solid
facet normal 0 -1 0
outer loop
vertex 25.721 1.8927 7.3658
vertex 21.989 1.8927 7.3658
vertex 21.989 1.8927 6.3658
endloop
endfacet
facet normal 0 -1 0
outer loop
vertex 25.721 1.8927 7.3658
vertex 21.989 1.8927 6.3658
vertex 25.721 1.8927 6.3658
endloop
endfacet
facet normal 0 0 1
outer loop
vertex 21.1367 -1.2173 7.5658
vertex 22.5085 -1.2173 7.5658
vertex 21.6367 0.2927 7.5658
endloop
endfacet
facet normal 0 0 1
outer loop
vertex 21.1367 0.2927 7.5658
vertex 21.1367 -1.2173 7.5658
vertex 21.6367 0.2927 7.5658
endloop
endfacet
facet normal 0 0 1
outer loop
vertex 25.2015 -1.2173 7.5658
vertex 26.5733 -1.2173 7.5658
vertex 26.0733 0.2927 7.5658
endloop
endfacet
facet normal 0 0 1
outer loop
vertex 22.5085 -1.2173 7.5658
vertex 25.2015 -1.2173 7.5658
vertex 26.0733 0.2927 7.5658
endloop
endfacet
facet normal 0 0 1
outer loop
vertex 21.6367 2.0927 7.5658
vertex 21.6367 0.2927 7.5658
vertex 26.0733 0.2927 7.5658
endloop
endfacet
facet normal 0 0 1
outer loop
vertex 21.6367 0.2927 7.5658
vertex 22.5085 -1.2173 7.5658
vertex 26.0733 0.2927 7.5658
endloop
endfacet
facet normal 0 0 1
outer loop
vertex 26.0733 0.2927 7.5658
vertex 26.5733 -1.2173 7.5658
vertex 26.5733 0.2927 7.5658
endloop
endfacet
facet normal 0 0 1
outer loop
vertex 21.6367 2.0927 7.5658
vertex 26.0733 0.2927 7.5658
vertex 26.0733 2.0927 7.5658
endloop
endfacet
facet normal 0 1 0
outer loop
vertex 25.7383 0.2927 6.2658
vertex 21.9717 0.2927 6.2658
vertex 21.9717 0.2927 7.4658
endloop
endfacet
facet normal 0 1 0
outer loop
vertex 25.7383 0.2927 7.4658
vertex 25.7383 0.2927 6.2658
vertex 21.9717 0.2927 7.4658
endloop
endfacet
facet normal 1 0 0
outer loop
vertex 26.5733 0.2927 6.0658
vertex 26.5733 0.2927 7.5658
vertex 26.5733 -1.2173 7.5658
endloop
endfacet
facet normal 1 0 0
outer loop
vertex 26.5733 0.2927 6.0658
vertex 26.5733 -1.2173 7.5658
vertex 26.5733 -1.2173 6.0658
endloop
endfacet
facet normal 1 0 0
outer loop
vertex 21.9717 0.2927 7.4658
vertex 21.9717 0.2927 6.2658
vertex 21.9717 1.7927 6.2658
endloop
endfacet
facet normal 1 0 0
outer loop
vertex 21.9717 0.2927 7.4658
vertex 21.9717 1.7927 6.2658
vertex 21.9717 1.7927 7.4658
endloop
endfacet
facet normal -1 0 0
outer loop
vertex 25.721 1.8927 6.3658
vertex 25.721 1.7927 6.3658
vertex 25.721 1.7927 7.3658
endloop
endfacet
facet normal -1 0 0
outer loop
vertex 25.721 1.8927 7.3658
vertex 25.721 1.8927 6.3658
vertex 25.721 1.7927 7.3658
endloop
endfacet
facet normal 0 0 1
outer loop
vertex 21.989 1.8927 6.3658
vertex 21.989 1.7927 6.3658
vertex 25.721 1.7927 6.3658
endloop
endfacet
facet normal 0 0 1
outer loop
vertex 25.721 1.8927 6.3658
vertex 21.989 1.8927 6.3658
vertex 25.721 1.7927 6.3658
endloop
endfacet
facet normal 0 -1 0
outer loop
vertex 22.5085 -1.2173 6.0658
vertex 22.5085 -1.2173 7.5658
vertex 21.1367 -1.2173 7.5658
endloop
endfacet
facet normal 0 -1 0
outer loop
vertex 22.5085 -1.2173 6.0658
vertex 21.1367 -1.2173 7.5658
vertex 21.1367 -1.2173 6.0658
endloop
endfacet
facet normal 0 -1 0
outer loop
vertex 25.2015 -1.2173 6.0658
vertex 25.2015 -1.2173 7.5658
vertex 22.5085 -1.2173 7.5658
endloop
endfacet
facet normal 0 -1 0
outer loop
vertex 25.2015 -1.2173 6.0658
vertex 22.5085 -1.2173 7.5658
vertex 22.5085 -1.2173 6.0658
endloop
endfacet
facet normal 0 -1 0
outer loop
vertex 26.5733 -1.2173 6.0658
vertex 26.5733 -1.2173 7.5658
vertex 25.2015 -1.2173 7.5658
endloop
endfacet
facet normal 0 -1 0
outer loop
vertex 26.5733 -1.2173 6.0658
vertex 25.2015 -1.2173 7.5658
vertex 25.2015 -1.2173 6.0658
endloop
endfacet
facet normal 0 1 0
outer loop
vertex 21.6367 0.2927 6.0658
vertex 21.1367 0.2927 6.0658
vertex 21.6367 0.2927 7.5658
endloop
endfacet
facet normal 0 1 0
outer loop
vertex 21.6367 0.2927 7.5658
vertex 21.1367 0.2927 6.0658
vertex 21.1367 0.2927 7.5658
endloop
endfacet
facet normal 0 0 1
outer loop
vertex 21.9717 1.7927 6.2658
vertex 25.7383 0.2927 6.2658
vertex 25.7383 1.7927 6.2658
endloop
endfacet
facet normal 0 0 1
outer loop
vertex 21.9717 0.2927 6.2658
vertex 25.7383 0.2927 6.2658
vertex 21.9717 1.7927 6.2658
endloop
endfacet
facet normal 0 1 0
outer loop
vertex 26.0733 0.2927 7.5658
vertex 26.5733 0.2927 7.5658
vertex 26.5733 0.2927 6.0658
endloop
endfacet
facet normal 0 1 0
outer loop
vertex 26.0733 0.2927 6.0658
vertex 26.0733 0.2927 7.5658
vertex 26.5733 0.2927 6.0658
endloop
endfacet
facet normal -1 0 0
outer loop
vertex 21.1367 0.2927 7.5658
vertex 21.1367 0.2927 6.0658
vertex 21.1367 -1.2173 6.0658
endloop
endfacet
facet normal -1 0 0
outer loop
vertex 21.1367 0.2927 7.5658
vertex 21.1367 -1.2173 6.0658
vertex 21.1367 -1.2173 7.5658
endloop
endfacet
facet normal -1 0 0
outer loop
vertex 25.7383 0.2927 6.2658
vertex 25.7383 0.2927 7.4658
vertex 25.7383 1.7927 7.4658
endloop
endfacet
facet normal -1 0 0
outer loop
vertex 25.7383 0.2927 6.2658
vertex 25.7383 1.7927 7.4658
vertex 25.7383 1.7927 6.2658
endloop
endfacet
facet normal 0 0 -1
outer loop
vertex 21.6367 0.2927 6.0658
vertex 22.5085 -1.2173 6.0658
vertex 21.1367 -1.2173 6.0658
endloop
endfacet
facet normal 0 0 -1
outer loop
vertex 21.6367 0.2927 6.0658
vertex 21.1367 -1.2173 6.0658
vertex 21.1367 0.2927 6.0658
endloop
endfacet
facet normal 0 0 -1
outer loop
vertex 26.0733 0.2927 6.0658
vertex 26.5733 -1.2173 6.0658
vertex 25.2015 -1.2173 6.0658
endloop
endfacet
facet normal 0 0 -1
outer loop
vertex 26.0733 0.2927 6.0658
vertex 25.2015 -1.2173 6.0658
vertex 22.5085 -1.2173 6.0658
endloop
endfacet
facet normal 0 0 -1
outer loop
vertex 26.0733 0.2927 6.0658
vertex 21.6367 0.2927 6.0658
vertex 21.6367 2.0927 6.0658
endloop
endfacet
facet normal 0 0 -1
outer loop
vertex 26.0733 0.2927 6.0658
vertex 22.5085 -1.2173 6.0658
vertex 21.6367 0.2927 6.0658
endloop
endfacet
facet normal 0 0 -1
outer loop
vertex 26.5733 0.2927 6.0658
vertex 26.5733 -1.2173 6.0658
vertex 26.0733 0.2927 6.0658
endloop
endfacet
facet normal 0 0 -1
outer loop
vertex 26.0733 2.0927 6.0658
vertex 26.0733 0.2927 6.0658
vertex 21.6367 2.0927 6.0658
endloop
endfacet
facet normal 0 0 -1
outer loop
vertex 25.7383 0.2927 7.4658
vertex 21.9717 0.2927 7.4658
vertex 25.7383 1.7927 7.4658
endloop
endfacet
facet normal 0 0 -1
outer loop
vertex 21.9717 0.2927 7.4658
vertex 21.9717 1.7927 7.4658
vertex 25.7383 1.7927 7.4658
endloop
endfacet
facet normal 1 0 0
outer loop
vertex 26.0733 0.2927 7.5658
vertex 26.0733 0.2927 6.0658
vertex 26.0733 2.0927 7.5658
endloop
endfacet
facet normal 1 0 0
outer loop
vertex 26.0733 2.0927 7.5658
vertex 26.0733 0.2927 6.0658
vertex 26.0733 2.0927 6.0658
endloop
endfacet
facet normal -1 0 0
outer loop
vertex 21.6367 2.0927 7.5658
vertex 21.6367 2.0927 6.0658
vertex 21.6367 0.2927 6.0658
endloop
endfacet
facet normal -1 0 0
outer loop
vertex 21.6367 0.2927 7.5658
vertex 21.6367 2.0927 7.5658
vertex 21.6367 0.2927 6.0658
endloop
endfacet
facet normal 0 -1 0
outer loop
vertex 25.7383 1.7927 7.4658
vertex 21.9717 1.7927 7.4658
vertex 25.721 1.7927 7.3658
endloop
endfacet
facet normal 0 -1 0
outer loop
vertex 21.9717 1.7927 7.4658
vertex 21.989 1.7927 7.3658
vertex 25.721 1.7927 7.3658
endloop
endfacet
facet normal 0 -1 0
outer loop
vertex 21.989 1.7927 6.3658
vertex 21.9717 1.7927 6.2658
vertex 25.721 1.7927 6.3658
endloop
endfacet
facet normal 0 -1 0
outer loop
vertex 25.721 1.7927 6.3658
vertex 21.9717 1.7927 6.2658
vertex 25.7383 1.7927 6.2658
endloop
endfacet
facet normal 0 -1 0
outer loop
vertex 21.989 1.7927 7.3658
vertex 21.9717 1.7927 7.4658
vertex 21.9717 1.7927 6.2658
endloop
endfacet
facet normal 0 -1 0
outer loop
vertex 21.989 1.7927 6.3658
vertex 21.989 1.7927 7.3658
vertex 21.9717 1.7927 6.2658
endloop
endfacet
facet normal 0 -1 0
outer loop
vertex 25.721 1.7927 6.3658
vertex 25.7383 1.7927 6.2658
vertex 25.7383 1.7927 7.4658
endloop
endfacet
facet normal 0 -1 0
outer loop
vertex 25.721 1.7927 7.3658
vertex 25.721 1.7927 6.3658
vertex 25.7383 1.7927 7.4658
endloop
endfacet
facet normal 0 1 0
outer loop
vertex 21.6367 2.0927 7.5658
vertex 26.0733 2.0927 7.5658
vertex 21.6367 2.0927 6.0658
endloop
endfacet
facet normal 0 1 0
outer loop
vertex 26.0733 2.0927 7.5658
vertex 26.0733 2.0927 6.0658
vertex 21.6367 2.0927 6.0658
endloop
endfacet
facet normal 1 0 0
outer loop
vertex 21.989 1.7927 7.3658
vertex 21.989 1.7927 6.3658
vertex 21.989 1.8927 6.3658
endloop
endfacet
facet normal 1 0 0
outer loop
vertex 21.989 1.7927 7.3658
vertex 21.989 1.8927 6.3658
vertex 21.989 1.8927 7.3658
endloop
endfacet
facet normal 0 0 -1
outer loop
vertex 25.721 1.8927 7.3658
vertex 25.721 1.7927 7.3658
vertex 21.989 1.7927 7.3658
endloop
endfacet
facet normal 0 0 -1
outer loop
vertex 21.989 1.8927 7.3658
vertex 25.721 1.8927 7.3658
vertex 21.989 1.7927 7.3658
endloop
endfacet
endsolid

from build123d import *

# Parameters (mm, degrees)
EXTRUDE_1_DEPTH     = 2
EXTRUDE_5_DEPTH     = 12
SKETCH_3_R          = 2
EXTRUDE_6_DEPTH     = 12
CUT_EXTRUDE_1_DEPTH = 12
EXTRUDE_7_DEPTH     = 15
SKETCH_7_W          = 44.36597813
SKETCH_7_H          = 14
EXTRUDE_8_DEPTH     = 3
SKETCH_9_W          = 18.66
SKETCH_9_H          = 10
CUT_EXTRUDE_3_DEPTH = 1
EXTRUDE_9_DEPTH     = 1
SCALE_1_SCALE       = 0.1
SKETCH_11_W         = 1.5
SKETCH_11_H         = 1.51
EXTRUDE_10_DEPTH    = 0.5
SKETCH_12_W         = 1.5
SKETCH_12_H         = 1.51
EXTRUDE_11_DEPTH    = 0.5
SKETCH_13_W         = 5.436597812
SKETCH_13_H         = 1.51
EXTRUDE_12_DEPTH    = 1.5


with BuildPart() as part:
    # 스케치2 → 보스-돌출1 (new body)
    with BuildSketch(Plane.XY):
        Polygon((0, 0), (47.71, 0), (37.32, -17.996007891), (10.39, -17.996007891), align=None)
    extrude(amount=EXTRUDE_1_DEPTH)

    # 스케치4 → 보스-돌출5 (add)
    with BuildSketch(Plane.XY.offset(2)):
        Polygon((13.739529946, -17.996007891), (5.021540881, -2.896007891), (1.672010935, -2.896007891), (10.39, -17.996007891), align=None)
        Polygon((46.037989065, -2.896007891), (42.688459119, -2.896007891), (33.970470054, -17.996007891), (37.32, -17.996007891), align=None)
    extrude(amount=EXTRUDE_5_DEPTH)

    # 스케치3 → 보스-돌출6 (add)
    with BuildSketch(Plane.XY.offset(2)):
        with Locations(Location((15.355, -11.594084102, 0), (0, 0, 180))):
            Circle(SKETCH_3_R)
        with Locations((32.355, -11.594084102)):
            Circle(SKETCH_3_R)
    extrude(amount=EXTRUDE_6_DEPTH)

    # 스케치5 → 컷-돌출1 (cut)
    with BuildSketch(Plane.XY.offset(2)):
        Polygon((0, 0), (47.71, 0), (46.037989065, -2.896007891), (1.672010935, -2.896007891), align=None)
    extrude(amount=-CUT_EXTRUDE_1_DEPTH, mode=Mode.SUBTRACT)

    # 스케치6 → 보스-돌출7 (add)
    with BuildSketch(Plane(origin=(0, -2.896007891, 0), x_dir=(1, 0, 0), z_dir=(0, 1, 0))):
        Polygon((5.021540881, -14), (1.672010935, -14), (1.672010935, 0), (46.037989065, 0), (46.037989065, -14), (42.688459119, -14), (42.688459119, -2), (5.021540881, -2), align=None)
    extrude(amount=EXTRUDE_7_DEPTH)

    # 스케치7 → 보스-돌출8 (add)
    with BuildSketch(Plane(origin=(0, 12.103992109, 0), x_dir=(1, 0, 0), z_dir=(0, 1, 0))):
        with Locations((23.855, -7)):
            Rectangle(SKETCH_7_W, SKETCH_7_H)
    extrude(amount=EXTRUDE_8_DEPTH)

    # 스케치9 → 컷-돌출3 (cut)
    with BuildSketch(Plane.XZ.offset(-12.103992109)):
        with Locations((14.525, 8)):
            Rectangle(SKETCH_9_W, SKETCH_9_H)
        with Locations((33.185, 8)):
            Rectangle(SKETCH_9_W, SKETCH_9_H)
    extrude(amount=-CUT_EXTRUDE_3_DEPTH, mode=Mode.SUBTRACT)

    # 스케치10 → 보스-돌출9 (add)
    with BuildSketch(Plane.XY.offset(14)):
        Polygon((10.39, -17.996007891), (37.32, -17.996007891), (46.037989065, -2.896007891), (46.037989065, 15.103992109), (1.672010935, 15.103992109), (1.672010935, -2.896007891), align=None)
    extrude(amount=EXTRUDE_9_DEPTH)


with BuildPart() as part_1:
    # 축척1: scaled about (23.855, 0.64704732, 6.739732729)
    add(part.part.scale(SCALE_1_SCALE).moved(Location((21.4695, 0.582342588, 6.065759456))))

    # 스케치11 → 보스-돌출10 (add, symmetric)
    with BuildSketch(Plane.ZY.offset(-21.636701094)):
        with Locations((6.815759456, -0.462258201)):
            Rectangle(SKETCH_11_W, SKETCH_11_H)
    extrude(amount=EXTRUDE_10_DEPTH, both=True)

    # 스케치12 → 보스-돌출11 (add, symmetric)
    with BuildSketch(Plane(origin=(26.073298906, 0, 0), x_dir=(0, 0, -1), z_dir=(1, 0, 0))):
        with Locations((-6.815759456, -0.462258201)):
            Rectangle(SKETCH_12_W, SKETCH_12_H)
    extrude(amount=EXTRUDE_11_DEPTH, both=True)

    # 스케치13 → 보스-돌출12 (add)
    with BuildSketch(Plane(origin=(0, 0, 6.065759456), x_dir=(-1, 0, 0), z_dir=(0, 0, -1))):
        with Locations((-23.855, -0.462258201)):
            Rectangle(SKETCH_13_W, SKETCH_13_H)
    extrude(amount=-EXTRUDE_12_DEPTH)


solid = part_1.part
